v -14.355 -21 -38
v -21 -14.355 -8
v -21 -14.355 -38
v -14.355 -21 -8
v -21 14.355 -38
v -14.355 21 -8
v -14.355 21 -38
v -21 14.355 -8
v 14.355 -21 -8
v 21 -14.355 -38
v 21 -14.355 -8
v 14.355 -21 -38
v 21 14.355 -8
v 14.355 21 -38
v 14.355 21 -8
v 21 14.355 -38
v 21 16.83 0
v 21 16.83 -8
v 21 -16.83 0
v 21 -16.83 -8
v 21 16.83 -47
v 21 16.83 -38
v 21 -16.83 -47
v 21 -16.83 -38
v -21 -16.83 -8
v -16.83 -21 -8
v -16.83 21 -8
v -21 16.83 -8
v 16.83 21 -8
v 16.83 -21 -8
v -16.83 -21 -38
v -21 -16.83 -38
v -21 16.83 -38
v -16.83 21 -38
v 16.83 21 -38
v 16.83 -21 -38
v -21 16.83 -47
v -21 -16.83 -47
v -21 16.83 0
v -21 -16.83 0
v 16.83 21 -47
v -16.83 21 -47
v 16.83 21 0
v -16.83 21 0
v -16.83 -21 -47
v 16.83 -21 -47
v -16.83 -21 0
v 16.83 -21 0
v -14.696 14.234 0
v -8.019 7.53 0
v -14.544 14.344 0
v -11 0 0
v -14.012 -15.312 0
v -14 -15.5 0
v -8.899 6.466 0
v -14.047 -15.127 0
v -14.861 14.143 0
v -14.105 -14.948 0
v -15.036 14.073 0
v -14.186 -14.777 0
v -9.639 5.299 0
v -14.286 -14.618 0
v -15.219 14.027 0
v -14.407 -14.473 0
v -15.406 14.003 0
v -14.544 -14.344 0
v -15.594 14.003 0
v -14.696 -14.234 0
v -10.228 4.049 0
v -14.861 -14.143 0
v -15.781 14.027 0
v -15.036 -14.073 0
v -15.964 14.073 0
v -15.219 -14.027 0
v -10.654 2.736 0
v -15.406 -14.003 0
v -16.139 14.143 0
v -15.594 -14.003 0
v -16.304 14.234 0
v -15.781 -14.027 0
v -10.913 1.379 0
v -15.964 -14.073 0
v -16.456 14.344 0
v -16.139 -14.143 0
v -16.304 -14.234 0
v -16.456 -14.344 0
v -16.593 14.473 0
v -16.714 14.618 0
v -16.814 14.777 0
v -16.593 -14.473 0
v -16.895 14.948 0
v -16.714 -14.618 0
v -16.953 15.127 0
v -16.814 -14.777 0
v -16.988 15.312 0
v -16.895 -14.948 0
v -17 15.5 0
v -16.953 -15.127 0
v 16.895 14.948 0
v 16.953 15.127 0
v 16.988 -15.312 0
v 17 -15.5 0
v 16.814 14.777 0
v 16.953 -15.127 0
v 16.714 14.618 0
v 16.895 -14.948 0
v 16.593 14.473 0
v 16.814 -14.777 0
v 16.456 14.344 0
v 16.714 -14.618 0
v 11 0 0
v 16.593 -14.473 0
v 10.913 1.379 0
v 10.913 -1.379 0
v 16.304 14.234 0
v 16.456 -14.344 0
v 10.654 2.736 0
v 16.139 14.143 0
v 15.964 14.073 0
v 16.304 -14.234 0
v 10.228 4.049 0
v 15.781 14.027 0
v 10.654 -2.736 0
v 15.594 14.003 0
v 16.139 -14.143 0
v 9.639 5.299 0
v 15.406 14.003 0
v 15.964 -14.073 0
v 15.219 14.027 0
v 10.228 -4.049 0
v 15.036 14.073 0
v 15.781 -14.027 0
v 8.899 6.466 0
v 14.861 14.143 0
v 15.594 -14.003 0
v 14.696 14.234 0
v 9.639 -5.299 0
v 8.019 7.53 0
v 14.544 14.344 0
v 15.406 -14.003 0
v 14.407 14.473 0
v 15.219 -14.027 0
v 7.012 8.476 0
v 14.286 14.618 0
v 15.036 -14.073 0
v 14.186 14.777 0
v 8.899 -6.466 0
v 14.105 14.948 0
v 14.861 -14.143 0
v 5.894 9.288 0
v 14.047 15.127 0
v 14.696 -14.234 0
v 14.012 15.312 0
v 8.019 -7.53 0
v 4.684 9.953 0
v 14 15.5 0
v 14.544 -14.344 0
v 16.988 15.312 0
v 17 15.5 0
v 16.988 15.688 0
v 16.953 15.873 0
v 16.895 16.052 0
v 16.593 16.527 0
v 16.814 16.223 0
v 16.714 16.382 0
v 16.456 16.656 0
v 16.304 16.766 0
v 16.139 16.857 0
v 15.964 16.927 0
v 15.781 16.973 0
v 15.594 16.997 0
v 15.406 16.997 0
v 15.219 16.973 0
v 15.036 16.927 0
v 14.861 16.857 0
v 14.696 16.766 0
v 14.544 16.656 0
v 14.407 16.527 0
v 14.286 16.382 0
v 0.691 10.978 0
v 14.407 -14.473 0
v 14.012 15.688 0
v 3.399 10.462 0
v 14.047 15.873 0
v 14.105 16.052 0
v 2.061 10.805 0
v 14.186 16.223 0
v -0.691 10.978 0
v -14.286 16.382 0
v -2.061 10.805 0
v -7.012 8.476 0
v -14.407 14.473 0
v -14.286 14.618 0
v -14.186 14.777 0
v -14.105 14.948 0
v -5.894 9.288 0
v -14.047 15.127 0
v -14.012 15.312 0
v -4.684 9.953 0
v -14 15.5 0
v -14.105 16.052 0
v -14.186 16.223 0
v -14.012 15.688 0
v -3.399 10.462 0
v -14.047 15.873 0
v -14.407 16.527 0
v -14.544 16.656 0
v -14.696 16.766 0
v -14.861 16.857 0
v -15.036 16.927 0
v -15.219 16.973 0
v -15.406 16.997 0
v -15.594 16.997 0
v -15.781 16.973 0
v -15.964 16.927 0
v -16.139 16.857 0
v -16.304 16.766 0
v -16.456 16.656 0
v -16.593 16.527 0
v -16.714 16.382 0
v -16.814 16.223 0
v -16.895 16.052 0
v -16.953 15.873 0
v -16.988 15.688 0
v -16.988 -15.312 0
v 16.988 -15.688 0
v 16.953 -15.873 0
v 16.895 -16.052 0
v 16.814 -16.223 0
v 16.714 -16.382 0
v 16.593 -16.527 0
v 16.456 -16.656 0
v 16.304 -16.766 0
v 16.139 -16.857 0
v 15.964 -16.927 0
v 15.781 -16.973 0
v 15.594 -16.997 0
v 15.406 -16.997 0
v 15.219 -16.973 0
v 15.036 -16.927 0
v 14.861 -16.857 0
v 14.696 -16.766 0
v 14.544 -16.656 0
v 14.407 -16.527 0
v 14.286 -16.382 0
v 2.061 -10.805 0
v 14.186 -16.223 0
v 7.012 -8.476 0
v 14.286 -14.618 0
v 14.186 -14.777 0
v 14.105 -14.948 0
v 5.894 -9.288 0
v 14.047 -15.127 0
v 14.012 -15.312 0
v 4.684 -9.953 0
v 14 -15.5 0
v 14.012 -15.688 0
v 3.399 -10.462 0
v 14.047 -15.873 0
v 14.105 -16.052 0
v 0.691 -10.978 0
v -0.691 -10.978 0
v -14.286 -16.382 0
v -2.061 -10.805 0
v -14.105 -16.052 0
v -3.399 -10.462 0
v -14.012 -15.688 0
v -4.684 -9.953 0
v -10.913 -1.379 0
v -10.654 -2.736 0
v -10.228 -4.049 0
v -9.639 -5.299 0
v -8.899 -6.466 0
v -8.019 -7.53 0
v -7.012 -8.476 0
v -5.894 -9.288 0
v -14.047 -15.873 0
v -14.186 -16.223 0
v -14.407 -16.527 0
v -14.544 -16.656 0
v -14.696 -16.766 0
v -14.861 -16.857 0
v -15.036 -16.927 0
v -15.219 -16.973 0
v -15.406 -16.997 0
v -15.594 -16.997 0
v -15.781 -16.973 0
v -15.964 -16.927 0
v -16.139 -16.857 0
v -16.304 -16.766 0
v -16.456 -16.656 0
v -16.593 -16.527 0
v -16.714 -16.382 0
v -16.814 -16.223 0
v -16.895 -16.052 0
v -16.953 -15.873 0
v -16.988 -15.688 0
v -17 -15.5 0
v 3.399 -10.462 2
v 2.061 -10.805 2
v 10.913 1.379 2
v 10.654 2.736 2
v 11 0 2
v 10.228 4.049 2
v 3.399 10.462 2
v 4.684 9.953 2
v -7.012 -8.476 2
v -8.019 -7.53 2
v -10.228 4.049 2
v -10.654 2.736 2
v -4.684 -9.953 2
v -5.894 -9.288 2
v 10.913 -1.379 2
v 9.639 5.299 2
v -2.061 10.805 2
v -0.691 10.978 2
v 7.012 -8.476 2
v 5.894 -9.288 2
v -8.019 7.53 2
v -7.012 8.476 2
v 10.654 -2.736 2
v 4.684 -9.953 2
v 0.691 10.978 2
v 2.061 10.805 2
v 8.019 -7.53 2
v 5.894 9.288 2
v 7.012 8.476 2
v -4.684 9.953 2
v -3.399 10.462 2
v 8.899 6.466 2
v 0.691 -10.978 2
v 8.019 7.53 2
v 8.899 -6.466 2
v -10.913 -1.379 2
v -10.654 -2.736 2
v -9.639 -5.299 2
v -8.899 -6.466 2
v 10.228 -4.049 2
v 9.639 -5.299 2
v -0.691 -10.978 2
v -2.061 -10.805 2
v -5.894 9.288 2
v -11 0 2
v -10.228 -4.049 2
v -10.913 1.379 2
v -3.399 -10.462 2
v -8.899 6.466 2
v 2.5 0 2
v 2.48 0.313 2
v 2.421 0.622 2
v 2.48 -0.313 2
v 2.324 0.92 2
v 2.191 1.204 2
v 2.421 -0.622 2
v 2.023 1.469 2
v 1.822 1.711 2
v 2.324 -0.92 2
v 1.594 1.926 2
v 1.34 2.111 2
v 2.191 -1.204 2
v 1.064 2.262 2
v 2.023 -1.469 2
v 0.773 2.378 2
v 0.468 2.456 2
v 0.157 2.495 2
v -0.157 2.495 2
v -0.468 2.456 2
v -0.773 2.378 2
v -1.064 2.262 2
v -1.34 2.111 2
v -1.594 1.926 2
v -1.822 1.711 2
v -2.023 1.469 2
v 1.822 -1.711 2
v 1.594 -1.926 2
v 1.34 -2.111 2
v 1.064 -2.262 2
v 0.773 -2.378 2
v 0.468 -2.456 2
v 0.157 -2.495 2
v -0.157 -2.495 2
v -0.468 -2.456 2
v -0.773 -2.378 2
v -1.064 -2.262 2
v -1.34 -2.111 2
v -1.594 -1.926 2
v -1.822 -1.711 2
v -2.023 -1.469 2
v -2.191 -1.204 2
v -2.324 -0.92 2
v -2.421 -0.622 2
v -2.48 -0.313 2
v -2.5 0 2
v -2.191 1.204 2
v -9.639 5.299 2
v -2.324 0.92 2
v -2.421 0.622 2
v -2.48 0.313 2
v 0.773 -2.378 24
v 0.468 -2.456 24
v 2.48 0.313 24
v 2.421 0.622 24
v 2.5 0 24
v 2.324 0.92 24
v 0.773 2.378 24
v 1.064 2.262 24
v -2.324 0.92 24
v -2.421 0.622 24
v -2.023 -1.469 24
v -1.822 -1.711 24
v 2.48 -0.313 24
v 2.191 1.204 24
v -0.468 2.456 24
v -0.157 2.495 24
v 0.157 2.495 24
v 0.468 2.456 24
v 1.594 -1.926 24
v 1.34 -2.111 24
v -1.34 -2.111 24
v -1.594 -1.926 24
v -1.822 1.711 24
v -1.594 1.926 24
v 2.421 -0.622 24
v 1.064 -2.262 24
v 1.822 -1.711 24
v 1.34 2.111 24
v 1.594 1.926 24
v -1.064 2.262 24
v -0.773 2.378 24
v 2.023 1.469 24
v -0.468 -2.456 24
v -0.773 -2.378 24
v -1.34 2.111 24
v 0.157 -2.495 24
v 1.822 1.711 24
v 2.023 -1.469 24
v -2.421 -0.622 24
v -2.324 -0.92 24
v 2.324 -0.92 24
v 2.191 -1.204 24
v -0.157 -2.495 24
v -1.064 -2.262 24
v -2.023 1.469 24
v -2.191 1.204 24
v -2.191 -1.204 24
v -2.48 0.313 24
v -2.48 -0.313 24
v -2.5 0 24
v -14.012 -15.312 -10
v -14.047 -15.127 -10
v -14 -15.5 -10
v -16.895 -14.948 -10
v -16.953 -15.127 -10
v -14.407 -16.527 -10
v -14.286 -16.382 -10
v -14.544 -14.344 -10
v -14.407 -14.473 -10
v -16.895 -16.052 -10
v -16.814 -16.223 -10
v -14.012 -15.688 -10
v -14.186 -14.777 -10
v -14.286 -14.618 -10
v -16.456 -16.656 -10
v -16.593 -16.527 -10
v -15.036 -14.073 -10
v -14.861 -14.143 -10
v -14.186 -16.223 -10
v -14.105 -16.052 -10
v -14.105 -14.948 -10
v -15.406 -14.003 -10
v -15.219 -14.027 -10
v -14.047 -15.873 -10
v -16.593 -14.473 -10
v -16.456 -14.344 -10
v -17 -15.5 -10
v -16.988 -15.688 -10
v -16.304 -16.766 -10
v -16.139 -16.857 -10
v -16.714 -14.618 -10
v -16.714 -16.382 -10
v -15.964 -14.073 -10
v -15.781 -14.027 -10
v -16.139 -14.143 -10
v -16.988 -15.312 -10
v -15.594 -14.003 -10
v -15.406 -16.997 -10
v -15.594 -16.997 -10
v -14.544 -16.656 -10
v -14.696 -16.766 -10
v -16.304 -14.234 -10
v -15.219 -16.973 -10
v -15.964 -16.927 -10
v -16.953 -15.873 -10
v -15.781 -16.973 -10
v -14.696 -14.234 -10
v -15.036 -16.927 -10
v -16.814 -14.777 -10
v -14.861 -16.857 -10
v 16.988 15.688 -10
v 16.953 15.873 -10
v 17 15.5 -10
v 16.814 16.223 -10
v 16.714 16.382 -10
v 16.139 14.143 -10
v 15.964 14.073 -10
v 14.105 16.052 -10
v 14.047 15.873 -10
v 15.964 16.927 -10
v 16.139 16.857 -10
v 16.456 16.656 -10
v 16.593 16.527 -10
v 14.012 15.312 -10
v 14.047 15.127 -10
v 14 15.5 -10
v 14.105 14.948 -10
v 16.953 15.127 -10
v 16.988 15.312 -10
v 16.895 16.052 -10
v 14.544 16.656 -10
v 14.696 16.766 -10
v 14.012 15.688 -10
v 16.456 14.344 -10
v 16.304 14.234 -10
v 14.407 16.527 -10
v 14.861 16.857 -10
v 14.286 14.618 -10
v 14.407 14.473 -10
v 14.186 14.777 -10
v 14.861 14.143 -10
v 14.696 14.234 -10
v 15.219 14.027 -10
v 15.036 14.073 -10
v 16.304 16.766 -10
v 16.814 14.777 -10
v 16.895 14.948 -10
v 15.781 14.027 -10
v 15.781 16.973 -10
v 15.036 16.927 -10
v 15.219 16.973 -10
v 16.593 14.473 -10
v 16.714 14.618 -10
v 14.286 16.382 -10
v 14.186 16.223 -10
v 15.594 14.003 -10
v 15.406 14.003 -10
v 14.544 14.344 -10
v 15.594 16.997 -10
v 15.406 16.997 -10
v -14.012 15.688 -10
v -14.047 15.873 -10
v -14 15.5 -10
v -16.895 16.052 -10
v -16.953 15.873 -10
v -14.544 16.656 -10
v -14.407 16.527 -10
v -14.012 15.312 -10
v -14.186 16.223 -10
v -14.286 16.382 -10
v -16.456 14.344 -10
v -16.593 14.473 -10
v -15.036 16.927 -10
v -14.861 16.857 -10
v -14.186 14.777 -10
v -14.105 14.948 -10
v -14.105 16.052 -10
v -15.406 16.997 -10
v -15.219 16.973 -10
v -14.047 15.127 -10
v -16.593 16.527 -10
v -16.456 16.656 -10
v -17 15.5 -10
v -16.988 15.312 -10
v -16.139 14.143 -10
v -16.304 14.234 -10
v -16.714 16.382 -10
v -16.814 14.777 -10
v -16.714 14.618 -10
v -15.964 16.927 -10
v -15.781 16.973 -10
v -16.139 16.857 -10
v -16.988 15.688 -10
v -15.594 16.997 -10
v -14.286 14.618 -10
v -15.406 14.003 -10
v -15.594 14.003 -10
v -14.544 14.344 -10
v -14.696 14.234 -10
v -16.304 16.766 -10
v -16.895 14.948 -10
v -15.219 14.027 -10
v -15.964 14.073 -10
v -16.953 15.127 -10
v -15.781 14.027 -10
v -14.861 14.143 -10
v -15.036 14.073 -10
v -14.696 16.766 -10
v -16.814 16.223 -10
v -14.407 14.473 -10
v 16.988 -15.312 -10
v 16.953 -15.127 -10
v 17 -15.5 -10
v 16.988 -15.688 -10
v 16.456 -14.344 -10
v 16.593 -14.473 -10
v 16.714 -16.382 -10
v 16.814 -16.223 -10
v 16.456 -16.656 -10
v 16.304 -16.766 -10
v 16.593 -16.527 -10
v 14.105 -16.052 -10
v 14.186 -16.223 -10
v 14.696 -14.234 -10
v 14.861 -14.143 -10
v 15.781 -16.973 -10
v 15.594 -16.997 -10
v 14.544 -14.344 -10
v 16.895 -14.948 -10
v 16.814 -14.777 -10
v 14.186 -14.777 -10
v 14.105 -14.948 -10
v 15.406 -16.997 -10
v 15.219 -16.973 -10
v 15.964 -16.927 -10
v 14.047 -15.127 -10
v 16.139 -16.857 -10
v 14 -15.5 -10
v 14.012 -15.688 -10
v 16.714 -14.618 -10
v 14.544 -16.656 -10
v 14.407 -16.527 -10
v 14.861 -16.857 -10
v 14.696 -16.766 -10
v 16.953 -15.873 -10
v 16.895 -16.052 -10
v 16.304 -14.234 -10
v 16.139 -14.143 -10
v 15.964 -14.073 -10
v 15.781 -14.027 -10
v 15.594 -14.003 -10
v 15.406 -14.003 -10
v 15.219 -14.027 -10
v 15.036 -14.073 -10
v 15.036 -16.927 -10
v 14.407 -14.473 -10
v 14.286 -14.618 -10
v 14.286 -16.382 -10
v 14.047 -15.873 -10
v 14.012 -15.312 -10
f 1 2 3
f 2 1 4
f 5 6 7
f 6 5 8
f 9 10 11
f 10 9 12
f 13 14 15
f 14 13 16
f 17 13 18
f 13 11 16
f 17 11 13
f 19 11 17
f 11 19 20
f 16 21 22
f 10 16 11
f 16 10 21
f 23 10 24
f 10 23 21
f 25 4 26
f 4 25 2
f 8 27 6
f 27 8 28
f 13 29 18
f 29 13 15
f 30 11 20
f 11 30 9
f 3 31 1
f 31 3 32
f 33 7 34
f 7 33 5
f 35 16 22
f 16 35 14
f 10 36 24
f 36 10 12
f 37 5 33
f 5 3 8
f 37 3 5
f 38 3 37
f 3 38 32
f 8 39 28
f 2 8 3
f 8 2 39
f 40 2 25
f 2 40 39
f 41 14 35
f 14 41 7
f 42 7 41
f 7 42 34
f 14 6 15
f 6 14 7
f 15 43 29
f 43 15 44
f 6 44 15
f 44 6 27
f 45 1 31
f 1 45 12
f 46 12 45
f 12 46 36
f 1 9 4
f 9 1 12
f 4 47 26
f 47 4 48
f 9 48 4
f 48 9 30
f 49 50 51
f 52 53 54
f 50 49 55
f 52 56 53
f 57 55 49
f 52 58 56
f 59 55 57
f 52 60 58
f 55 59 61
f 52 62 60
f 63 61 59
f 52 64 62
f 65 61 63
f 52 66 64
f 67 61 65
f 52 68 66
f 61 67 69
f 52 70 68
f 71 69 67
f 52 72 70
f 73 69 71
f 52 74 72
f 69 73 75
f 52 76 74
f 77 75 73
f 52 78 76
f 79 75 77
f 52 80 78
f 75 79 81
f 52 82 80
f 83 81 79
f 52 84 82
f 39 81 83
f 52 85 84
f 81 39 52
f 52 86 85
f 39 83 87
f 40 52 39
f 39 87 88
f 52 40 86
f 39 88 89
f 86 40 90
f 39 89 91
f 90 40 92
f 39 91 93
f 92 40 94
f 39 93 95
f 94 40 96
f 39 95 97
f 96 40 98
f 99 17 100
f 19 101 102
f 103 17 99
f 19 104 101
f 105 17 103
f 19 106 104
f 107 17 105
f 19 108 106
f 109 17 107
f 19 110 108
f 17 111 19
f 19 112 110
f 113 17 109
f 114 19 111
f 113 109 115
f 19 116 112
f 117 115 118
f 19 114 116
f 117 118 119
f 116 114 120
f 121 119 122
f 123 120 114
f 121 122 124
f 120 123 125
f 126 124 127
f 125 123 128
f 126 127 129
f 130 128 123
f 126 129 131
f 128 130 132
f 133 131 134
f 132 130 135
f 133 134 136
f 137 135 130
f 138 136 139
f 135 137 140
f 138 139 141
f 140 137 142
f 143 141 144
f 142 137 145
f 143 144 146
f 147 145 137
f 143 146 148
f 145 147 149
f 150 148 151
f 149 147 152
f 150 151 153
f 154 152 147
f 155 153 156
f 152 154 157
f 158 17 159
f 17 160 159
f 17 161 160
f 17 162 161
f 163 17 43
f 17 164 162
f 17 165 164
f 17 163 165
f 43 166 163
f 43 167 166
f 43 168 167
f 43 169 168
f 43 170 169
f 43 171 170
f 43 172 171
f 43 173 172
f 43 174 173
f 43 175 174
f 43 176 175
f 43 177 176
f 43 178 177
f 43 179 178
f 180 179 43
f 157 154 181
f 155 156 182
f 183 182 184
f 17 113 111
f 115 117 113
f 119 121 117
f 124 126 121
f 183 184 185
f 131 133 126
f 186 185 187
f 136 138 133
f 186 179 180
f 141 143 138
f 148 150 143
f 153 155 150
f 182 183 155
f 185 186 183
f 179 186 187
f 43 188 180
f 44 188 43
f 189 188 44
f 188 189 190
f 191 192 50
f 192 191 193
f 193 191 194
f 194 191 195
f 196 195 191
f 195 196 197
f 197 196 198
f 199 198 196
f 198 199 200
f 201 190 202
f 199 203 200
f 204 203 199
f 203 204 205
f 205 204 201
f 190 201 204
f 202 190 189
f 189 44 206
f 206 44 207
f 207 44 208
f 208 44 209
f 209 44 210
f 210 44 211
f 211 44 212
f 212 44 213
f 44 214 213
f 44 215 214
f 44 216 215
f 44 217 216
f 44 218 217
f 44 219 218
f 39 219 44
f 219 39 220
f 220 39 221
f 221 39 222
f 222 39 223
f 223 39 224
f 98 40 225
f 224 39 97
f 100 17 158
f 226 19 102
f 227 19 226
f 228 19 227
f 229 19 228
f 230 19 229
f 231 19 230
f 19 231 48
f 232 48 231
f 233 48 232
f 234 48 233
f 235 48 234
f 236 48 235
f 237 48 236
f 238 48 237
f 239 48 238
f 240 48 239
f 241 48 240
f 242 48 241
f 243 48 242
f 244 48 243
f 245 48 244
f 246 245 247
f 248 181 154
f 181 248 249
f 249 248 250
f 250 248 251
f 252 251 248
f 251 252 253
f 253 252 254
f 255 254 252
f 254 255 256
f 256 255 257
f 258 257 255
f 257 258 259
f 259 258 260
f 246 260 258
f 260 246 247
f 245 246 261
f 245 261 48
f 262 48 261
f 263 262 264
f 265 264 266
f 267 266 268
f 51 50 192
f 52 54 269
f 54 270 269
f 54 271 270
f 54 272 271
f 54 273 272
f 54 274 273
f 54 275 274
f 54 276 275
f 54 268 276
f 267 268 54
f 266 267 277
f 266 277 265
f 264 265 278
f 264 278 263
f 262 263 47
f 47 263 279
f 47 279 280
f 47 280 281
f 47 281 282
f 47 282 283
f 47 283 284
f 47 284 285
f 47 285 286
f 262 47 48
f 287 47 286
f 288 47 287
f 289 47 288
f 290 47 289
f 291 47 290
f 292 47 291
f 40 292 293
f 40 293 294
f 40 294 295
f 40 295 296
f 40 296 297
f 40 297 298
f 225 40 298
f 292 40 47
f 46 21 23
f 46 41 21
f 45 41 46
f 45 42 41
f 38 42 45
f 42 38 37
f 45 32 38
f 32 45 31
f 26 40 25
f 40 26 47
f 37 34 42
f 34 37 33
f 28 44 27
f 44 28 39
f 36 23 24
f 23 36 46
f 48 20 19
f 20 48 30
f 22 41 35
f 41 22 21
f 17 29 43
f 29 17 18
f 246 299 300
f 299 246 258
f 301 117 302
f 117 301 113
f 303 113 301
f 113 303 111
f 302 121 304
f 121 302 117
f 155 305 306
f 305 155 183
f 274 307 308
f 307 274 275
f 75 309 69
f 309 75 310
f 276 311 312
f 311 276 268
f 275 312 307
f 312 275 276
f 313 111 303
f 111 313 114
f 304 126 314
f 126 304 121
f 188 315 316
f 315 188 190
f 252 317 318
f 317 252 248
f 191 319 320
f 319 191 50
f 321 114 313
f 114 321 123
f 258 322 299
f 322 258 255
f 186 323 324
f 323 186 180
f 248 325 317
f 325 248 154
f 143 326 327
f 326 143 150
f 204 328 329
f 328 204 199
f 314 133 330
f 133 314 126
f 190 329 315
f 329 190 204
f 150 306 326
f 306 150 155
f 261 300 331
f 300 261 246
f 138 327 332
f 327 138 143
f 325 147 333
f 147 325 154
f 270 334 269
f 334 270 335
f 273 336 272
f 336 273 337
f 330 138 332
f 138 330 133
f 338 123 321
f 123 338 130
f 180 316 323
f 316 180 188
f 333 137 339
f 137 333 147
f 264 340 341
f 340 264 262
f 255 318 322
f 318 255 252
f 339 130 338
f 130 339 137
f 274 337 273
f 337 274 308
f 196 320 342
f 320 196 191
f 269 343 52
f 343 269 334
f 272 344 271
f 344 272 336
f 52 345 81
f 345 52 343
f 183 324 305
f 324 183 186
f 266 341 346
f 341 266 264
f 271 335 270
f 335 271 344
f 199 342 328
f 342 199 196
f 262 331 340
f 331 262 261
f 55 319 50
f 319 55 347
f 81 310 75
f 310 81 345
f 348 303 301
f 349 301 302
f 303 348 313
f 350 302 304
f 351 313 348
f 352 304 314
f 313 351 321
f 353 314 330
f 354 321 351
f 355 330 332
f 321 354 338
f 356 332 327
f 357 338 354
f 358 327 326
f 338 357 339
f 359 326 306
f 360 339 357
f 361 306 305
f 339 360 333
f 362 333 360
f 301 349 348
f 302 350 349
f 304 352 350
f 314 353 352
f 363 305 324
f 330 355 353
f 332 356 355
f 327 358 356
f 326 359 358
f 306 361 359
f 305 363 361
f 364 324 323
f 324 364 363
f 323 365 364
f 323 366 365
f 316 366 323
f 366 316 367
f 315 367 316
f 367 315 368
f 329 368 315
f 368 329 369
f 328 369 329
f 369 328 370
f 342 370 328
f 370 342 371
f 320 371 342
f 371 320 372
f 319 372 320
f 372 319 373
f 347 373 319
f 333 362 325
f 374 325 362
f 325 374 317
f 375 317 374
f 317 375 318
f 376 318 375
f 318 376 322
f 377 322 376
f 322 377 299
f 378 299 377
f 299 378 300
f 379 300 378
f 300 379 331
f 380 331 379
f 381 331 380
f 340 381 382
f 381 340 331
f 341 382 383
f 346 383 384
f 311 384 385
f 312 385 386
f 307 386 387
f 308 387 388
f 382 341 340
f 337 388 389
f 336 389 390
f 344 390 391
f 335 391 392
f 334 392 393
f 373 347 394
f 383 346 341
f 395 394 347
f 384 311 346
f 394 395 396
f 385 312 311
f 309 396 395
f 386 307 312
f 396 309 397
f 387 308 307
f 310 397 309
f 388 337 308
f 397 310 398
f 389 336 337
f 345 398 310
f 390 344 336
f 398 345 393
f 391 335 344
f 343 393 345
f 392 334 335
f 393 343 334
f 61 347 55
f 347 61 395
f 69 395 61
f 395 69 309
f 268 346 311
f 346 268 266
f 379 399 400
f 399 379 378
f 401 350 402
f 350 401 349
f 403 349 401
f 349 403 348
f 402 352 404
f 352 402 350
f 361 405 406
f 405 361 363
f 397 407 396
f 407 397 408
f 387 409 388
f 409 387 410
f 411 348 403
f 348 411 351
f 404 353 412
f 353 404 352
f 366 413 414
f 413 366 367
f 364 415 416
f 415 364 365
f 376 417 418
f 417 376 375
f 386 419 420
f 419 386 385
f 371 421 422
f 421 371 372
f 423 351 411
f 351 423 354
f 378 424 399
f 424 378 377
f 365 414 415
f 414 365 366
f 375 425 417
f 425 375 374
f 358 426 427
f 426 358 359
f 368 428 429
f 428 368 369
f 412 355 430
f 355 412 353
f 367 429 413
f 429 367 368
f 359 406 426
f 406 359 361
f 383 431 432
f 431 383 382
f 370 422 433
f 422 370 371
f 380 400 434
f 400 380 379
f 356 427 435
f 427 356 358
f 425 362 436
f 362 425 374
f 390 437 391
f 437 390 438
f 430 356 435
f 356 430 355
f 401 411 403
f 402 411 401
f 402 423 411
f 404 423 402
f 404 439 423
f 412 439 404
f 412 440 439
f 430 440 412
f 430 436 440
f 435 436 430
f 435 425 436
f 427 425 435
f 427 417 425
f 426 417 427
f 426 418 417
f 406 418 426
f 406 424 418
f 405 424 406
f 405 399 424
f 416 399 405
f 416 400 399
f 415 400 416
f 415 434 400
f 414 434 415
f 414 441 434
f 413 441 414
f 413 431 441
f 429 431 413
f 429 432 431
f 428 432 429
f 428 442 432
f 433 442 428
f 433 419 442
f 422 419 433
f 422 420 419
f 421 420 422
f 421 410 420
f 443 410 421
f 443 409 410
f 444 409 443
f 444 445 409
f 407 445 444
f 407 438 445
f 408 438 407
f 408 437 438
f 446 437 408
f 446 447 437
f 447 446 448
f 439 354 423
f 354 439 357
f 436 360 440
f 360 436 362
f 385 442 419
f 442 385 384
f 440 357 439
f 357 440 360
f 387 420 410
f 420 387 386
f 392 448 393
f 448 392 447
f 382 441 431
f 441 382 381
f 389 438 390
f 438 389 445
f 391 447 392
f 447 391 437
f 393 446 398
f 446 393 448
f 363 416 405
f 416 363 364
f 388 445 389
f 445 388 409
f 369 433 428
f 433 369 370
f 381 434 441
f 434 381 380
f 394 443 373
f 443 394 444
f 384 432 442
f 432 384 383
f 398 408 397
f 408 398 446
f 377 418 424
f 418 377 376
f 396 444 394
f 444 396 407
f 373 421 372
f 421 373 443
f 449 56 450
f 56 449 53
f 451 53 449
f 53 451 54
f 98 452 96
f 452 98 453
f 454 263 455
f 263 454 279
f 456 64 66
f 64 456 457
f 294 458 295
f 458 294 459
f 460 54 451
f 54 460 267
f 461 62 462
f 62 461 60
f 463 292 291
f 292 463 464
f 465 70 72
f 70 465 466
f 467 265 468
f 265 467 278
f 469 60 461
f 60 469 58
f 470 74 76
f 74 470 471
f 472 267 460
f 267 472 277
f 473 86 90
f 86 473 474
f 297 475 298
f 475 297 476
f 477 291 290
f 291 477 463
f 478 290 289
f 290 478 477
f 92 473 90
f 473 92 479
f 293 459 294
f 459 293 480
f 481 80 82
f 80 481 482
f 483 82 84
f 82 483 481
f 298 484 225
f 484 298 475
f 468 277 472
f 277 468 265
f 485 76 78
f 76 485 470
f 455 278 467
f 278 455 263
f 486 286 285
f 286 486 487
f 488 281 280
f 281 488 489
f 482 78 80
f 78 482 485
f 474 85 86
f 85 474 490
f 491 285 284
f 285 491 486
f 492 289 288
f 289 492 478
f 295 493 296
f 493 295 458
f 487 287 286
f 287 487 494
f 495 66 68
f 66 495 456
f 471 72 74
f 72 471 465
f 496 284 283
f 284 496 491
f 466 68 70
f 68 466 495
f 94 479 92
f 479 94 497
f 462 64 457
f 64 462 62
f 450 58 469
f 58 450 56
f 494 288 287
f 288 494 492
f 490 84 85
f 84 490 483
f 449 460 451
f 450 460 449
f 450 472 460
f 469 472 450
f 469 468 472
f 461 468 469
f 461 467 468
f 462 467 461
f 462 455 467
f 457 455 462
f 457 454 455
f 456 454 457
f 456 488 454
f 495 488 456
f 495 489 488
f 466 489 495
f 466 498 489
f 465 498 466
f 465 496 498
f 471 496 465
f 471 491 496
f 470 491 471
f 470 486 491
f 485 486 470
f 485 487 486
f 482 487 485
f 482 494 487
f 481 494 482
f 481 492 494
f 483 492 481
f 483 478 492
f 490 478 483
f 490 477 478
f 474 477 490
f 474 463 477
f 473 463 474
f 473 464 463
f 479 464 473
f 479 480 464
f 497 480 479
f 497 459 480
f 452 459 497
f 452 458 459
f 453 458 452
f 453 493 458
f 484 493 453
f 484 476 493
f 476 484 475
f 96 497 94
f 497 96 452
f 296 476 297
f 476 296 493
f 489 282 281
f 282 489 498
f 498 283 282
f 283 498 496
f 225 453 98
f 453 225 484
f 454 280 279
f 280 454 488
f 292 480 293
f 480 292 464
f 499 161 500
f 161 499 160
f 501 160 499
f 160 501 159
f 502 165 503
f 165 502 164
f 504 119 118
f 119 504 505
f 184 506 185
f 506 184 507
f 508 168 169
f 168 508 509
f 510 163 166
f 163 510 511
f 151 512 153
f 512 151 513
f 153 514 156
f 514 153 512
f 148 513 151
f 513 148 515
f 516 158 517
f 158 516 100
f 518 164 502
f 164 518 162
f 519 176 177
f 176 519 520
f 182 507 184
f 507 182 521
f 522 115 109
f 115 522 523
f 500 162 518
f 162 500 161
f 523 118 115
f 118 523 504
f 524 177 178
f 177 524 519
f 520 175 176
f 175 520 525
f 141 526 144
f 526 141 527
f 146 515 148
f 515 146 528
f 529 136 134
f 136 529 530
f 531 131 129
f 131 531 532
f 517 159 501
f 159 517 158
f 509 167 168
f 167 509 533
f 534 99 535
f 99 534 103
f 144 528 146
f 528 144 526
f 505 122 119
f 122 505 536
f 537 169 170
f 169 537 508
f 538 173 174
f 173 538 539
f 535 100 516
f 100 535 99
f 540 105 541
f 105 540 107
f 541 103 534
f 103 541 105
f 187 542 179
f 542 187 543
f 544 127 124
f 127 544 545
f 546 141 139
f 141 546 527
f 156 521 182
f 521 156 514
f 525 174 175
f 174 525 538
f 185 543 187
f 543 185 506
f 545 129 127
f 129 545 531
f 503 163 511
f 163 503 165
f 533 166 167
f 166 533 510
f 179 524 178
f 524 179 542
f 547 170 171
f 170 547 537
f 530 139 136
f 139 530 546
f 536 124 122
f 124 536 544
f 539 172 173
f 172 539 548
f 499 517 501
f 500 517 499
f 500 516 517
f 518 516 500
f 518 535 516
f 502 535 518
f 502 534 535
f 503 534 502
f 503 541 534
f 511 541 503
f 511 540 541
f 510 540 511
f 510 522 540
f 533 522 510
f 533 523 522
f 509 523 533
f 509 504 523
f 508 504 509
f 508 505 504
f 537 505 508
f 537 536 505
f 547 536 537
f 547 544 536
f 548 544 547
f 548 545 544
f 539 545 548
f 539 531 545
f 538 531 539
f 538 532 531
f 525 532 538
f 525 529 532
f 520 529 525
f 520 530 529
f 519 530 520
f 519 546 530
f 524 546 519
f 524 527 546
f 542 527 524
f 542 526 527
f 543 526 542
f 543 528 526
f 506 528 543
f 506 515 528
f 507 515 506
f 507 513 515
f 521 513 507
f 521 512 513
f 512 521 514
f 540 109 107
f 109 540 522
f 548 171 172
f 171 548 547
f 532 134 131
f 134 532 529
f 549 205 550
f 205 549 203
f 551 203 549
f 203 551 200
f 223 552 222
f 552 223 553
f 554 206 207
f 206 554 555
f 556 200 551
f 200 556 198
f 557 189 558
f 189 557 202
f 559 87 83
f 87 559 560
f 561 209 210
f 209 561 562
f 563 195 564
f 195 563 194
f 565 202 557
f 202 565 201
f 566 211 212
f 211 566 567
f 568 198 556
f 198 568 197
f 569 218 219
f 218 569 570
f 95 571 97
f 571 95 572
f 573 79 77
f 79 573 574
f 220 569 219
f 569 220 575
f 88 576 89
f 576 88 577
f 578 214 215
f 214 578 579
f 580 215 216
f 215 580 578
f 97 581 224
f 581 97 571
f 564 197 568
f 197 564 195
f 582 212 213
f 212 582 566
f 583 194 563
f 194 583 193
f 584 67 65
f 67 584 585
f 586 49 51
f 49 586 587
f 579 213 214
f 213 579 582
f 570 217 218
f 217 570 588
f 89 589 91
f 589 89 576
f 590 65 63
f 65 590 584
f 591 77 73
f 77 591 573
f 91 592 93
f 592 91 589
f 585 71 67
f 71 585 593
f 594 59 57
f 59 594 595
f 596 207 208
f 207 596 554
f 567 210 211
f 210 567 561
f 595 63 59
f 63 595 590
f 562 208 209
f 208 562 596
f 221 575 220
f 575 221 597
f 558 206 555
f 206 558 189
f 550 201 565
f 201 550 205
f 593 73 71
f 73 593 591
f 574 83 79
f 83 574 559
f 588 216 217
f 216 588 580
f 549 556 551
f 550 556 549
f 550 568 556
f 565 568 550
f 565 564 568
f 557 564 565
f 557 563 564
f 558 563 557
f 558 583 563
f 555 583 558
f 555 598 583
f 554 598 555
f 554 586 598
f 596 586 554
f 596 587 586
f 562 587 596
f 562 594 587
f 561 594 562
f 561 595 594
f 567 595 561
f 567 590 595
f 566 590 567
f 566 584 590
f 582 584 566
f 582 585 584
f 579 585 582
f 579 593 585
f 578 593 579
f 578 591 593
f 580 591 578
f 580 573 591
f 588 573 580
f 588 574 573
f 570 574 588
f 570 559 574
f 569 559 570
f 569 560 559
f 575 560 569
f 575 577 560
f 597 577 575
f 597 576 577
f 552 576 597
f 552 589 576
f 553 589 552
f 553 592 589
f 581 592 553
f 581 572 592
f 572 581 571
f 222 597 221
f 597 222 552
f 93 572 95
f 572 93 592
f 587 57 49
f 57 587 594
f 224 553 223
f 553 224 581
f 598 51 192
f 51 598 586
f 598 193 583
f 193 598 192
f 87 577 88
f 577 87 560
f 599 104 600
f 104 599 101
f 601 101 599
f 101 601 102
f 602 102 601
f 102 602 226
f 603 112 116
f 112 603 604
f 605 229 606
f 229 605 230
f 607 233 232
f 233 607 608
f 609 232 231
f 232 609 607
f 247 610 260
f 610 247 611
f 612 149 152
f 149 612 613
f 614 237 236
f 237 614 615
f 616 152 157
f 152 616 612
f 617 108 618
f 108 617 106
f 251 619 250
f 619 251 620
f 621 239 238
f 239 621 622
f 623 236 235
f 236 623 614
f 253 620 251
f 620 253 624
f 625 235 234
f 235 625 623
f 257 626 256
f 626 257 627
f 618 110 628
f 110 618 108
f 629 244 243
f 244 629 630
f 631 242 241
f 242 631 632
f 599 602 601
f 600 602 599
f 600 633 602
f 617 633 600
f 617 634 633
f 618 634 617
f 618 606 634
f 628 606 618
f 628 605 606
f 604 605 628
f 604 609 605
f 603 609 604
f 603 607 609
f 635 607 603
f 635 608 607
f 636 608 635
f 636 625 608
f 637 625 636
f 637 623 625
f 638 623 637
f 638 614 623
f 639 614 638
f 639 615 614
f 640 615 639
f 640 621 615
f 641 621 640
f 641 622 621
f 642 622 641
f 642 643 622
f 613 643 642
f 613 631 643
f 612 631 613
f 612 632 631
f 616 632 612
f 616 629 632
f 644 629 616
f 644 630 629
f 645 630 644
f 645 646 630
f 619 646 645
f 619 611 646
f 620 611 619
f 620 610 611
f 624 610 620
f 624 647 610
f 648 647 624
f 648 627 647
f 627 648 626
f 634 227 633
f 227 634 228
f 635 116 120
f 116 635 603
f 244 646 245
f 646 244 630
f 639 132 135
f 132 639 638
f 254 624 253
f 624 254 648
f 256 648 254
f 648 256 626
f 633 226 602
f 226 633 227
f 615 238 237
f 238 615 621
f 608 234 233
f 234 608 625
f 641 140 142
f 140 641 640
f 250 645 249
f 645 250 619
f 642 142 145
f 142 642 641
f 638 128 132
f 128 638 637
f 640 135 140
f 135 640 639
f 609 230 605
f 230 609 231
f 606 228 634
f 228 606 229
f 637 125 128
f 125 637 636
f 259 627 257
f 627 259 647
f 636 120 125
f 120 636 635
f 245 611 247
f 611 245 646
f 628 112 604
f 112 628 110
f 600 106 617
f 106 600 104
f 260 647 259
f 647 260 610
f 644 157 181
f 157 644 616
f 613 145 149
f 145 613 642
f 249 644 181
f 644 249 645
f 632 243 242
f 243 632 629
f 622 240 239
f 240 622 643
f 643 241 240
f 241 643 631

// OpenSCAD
/*
NEMA 17 Stepper
*/
$fn=50;
difference (){
union (){
translate ([0,0,-23]){
color( "Black", 1 ) 
difference (){
cube([42,42,30], center = true) ;
      union (){
        difference (){
            rotate ([0,0,45])
            cube([60,60,50], center = true) ;
            rotate ([0,0,45])
            cube([50,50,52], center = true) ;
}}  
    
}

color( "Gainsboro", 1 ) 
difference (){
    union (){
        translate ([0,0,19])
        color( "Gainsboro", 1 ) 
        cube([42,42,8], center = true) ;
        translate ([0,0,-19.5])
        cube([42,42,9], center = true) ;
}
    union (){
        difference (){
            rotate ([0,0,45])
            cube([60,60,50], center = true) ;
            rotate ([0,0,45])
            cube([53.5,53.5,52], center = true) ;
}}}
}

    color( "Gainsboro", 1 ) 
    cylinder (d=22, h=2, center = false);
    color( "LightSlateGray", 1 ) 
    cylinder (d=5, h=24, center = false);
}
translate ([-15.5,-15.5,-10])
cylinder (d=3, h=24, center = false);
translate ([15.5,15.5,-10])
cylinder (d=3, h=24, center = false);
translate ([-15.5,15.5,-10])
cylinder (d=3, h=24, center = false);
translate ([15.5,-15.5,-10])
cylinder (d=3, h=24, center = false);



}
